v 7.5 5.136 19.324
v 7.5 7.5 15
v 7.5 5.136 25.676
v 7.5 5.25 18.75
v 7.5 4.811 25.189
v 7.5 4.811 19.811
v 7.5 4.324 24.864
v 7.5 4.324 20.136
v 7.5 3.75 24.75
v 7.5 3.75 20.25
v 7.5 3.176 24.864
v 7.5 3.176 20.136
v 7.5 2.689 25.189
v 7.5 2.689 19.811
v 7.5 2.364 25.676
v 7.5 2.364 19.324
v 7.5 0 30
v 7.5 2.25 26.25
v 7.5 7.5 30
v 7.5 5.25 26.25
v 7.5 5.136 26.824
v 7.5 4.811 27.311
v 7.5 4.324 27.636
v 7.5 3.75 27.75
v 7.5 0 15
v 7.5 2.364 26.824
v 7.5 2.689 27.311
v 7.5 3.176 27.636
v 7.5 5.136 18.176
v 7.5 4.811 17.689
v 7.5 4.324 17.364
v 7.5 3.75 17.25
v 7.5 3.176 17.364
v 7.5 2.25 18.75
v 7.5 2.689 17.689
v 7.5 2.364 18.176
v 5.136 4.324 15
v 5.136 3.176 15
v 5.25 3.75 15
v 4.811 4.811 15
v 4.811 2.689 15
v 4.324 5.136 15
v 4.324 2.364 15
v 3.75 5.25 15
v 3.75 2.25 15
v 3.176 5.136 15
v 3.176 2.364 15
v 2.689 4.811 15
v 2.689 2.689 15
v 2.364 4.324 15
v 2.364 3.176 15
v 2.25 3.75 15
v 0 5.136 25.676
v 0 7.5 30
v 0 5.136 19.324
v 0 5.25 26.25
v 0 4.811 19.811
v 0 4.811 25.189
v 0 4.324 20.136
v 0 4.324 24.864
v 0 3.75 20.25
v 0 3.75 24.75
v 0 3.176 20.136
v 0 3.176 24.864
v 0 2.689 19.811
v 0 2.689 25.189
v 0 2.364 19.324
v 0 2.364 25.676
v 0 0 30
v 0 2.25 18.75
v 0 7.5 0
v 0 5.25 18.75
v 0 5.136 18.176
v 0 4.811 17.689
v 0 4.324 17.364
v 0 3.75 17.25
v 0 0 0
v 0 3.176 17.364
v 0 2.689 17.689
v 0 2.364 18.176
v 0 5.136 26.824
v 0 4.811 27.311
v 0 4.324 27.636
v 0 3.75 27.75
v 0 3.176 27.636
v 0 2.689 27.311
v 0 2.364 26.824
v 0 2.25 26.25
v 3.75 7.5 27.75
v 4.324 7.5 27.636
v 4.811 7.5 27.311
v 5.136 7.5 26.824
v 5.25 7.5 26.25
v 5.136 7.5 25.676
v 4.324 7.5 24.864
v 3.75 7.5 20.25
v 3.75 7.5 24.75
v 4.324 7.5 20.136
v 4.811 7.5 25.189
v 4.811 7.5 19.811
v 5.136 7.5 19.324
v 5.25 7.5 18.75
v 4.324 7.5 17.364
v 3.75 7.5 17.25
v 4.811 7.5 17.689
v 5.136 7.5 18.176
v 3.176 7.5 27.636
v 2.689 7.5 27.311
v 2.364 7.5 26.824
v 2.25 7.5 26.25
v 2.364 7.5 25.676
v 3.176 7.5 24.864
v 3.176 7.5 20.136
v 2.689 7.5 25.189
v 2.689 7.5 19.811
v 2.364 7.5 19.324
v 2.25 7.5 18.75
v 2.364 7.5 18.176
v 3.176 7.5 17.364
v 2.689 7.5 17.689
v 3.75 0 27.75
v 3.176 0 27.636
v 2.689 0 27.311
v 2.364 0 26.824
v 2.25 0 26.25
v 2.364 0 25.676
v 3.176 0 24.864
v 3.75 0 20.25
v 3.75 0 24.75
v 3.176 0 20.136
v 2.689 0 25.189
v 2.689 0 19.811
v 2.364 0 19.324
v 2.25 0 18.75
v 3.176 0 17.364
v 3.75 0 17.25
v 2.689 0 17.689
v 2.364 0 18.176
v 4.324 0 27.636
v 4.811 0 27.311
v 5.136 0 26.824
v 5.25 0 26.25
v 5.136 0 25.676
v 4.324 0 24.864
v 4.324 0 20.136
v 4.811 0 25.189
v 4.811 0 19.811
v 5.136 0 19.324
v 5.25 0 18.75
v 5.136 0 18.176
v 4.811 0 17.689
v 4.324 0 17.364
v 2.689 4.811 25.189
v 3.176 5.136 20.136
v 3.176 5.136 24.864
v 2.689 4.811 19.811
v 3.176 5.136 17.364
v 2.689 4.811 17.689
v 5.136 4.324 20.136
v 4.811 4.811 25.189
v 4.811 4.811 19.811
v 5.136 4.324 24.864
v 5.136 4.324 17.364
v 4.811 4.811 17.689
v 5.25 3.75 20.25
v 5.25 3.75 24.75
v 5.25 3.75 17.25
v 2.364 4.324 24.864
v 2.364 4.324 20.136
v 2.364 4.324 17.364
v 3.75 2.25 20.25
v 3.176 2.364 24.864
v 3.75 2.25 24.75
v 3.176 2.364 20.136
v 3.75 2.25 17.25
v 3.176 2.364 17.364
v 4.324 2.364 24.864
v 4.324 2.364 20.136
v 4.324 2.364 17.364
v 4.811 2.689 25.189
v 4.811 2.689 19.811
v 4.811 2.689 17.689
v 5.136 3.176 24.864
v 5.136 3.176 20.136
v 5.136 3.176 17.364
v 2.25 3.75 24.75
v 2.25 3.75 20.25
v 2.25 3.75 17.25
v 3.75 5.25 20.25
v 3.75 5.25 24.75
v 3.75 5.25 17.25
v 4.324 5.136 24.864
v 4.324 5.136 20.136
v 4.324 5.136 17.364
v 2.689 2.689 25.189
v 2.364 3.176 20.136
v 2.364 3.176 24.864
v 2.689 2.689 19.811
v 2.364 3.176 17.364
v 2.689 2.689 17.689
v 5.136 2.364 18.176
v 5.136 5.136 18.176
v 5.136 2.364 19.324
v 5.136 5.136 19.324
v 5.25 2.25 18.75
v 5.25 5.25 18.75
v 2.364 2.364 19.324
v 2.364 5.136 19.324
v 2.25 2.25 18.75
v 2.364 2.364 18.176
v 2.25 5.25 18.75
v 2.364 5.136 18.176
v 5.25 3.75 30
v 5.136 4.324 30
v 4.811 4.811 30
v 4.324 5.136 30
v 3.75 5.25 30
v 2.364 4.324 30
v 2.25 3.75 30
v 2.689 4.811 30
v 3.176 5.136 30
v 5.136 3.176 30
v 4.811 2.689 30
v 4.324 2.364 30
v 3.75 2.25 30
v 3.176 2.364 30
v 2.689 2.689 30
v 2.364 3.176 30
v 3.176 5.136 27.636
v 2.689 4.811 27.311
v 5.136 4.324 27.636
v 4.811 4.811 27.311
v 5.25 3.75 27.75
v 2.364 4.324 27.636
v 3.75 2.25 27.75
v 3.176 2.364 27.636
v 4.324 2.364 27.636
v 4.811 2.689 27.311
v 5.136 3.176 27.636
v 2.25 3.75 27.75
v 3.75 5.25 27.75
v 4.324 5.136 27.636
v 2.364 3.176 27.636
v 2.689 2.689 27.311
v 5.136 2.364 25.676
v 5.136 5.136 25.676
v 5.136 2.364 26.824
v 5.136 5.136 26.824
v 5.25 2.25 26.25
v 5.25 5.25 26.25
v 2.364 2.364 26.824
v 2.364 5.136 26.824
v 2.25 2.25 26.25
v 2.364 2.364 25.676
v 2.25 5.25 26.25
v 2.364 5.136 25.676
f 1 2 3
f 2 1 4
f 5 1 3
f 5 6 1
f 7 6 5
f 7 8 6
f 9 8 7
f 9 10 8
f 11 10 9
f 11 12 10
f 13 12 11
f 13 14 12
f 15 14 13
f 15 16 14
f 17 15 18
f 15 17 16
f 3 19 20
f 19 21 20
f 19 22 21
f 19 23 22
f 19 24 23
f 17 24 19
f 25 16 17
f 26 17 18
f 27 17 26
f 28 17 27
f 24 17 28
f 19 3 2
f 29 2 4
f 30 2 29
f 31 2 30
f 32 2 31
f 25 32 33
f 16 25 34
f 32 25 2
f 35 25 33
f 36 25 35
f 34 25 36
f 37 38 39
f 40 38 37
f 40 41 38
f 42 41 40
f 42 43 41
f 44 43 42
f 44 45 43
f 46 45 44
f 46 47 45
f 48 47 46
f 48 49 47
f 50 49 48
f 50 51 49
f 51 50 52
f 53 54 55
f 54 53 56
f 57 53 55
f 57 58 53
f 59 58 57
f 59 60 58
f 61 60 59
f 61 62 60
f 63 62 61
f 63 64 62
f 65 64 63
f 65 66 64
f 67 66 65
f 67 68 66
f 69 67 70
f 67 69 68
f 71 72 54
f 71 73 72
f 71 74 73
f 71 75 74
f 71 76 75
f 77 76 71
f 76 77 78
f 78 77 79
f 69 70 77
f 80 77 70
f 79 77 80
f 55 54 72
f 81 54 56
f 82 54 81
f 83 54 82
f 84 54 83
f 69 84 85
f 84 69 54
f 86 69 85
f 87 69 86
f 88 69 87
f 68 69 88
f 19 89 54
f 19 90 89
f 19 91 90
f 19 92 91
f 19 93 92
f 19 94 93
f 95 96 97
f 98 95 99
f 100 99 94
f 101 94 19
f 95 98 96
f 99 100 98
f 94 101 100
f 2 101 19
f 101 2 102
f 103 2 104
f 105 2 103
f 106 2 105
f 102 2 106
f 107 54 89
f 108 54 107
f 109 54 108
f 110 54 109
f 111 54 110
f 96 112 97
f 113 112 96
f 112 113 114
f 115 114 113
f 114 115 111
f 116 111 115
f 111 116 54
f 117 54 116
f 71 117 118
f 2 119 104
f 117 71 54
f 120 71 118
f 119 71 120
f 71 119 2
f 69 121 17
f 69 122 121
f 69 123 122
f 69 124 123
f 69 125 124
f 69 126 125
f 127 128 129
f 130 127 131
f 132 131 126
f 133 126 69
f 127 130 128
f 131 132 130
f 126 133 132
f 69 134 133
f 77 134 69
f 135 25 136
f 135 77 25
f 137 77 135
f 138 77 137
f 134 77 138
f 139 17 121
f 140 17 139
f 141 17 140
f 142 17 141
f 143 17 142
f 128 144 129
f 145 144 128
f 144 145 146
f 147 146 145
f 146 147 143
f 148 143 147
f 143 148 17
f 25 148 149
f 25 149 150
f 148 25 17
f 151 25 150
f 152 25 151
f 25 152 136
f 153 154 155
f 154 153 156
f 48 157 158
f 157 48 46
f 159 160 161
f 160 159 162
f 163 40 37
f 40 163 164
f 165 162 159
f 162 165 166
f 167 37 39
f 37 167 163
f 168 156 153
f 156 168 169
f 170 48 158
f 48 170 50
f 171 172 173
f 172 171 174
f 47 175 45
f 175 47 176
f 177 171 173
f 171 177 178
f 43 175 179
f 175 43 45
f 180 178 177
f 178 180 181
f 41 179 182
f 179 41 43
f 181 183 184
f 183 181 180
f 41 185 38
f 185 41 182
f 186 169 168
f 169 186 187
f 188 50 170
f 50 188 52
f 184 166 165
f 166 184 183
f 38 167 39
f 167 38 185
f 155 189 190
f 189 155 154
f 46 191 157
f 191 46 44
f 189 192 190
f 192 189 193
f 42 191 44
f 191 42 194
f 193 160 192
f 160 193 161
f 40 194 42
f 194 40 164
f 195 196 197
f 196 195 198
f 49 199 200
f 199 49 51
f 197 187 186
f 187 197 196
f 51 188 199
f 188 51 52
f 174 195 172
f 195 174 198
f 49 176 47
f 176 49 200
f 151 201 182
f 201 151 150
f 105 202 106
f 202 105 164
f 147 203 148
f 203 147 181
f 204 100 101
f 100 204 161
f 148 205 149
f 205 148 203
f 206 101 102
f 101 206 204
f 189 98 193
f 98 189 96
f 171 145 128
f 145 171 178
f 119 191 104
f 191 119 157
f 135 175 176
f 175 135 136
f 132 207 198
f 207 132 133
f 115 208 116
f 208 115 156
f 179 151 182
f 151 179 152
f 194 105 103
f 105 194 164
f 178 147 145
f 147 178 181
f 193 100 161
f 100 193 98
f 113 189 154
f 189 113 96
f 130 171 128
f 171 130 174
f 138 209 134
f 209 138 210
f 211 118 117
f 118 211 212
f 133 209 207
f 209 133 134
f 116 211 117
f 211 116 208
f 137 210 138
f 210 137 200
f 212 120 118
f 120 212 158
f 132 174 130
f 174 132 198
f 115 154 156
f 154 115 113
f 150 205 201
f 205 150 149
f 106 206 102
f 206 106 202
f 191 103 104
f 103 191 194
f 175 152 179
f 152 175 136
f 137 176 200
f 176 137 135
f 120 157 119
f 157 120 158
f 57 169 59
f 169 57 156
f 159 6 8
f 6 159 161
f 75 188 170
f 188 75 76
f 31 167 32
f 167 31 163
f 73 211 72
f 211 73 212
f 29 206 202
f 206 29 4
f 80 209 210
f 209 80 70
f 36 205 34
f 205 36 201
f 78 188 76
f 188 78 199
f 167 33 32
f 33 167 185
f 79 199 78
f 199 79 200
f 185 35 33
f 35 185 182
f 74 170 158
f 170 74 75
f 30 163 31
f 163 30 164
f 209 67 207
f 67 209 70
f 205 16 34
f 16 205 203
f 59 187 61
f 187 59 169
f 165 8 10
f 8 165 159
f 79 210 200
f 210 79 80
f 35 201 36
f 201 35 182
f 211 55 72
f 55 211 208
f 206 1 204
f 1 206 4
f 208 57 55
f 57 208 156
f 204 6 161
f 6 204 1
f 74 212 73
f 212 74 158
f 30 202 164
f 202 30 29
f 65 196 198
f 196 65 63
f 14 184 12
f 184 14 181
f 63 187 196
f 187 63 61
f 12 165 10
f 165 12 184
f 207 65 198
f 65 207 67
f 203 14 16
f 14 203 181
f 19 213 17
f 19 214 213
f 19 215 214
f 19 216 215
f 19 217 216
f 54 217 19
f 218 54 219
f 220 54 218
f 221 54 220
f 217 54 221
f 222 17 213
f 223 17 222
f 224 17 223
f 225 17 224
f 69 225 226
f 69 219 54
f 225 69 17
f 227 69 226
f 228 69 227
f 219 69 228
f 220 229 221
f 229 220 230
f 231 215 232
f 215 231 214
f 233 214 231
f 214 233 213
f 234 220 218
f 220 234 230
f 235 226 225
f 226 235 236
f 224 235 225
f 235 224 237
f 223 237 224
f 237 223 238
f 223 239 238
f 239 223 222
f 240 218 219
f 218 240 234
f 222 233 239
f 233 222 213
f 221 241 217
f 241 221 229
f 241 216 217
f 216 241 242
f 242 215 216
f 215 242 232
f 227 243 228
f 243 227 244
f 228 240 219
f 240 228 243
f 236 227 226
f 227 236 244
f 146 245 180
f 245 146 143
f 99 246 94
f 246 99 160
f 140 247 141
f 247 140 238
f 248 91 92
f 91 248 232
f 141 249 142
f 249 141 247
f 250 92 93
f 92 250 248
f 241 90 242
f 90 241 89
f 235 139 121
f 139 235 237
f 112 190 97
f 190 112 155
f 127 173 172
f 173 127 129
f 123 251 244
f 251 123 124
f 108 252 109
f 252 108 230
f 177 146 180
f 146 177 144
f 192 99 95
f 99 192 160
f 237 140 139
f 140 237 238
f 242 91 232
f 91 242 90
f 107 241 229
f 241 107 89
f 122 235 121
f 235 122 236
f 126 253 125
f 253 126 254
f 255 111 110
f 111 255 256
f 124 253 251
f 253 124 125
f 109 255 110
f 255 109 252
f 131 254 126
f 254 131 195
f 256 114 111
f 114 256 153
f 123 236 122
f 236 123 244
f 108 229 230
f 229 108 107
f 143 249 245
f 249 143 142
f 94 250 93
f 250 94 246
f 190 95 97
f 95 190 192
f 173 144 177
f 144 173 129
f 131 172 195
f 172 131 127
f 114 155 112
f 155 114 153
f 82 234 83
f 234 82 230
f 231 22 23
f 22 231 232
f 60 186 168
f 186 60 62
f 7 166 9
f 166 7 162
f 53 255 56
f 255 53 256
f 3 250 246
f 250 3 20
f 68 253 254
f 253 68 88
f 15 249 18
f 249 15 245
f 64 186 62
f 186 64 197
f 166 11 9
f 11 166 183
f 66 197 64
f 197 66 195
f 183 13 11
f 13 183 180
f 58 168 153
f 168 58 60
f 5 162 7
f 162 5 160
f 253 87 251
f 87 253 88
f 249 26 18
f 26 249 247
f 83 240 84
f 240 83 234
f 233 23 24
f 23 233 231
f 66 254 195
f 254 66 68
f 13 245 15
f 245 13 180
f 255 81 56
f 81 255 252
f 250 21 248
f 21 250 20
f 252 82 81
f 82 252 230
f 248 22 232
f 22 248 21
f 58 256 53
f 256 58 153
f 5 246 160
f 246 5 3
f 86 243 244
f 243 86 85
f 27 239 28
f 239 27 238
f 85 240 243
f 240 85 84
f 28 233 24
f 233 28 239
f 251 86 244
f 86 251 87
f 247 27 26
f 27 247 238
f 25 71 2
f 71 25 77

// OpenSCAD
use <../nscad-lib.scad>

color("orange") erweiterung2xZ(length = 2);
